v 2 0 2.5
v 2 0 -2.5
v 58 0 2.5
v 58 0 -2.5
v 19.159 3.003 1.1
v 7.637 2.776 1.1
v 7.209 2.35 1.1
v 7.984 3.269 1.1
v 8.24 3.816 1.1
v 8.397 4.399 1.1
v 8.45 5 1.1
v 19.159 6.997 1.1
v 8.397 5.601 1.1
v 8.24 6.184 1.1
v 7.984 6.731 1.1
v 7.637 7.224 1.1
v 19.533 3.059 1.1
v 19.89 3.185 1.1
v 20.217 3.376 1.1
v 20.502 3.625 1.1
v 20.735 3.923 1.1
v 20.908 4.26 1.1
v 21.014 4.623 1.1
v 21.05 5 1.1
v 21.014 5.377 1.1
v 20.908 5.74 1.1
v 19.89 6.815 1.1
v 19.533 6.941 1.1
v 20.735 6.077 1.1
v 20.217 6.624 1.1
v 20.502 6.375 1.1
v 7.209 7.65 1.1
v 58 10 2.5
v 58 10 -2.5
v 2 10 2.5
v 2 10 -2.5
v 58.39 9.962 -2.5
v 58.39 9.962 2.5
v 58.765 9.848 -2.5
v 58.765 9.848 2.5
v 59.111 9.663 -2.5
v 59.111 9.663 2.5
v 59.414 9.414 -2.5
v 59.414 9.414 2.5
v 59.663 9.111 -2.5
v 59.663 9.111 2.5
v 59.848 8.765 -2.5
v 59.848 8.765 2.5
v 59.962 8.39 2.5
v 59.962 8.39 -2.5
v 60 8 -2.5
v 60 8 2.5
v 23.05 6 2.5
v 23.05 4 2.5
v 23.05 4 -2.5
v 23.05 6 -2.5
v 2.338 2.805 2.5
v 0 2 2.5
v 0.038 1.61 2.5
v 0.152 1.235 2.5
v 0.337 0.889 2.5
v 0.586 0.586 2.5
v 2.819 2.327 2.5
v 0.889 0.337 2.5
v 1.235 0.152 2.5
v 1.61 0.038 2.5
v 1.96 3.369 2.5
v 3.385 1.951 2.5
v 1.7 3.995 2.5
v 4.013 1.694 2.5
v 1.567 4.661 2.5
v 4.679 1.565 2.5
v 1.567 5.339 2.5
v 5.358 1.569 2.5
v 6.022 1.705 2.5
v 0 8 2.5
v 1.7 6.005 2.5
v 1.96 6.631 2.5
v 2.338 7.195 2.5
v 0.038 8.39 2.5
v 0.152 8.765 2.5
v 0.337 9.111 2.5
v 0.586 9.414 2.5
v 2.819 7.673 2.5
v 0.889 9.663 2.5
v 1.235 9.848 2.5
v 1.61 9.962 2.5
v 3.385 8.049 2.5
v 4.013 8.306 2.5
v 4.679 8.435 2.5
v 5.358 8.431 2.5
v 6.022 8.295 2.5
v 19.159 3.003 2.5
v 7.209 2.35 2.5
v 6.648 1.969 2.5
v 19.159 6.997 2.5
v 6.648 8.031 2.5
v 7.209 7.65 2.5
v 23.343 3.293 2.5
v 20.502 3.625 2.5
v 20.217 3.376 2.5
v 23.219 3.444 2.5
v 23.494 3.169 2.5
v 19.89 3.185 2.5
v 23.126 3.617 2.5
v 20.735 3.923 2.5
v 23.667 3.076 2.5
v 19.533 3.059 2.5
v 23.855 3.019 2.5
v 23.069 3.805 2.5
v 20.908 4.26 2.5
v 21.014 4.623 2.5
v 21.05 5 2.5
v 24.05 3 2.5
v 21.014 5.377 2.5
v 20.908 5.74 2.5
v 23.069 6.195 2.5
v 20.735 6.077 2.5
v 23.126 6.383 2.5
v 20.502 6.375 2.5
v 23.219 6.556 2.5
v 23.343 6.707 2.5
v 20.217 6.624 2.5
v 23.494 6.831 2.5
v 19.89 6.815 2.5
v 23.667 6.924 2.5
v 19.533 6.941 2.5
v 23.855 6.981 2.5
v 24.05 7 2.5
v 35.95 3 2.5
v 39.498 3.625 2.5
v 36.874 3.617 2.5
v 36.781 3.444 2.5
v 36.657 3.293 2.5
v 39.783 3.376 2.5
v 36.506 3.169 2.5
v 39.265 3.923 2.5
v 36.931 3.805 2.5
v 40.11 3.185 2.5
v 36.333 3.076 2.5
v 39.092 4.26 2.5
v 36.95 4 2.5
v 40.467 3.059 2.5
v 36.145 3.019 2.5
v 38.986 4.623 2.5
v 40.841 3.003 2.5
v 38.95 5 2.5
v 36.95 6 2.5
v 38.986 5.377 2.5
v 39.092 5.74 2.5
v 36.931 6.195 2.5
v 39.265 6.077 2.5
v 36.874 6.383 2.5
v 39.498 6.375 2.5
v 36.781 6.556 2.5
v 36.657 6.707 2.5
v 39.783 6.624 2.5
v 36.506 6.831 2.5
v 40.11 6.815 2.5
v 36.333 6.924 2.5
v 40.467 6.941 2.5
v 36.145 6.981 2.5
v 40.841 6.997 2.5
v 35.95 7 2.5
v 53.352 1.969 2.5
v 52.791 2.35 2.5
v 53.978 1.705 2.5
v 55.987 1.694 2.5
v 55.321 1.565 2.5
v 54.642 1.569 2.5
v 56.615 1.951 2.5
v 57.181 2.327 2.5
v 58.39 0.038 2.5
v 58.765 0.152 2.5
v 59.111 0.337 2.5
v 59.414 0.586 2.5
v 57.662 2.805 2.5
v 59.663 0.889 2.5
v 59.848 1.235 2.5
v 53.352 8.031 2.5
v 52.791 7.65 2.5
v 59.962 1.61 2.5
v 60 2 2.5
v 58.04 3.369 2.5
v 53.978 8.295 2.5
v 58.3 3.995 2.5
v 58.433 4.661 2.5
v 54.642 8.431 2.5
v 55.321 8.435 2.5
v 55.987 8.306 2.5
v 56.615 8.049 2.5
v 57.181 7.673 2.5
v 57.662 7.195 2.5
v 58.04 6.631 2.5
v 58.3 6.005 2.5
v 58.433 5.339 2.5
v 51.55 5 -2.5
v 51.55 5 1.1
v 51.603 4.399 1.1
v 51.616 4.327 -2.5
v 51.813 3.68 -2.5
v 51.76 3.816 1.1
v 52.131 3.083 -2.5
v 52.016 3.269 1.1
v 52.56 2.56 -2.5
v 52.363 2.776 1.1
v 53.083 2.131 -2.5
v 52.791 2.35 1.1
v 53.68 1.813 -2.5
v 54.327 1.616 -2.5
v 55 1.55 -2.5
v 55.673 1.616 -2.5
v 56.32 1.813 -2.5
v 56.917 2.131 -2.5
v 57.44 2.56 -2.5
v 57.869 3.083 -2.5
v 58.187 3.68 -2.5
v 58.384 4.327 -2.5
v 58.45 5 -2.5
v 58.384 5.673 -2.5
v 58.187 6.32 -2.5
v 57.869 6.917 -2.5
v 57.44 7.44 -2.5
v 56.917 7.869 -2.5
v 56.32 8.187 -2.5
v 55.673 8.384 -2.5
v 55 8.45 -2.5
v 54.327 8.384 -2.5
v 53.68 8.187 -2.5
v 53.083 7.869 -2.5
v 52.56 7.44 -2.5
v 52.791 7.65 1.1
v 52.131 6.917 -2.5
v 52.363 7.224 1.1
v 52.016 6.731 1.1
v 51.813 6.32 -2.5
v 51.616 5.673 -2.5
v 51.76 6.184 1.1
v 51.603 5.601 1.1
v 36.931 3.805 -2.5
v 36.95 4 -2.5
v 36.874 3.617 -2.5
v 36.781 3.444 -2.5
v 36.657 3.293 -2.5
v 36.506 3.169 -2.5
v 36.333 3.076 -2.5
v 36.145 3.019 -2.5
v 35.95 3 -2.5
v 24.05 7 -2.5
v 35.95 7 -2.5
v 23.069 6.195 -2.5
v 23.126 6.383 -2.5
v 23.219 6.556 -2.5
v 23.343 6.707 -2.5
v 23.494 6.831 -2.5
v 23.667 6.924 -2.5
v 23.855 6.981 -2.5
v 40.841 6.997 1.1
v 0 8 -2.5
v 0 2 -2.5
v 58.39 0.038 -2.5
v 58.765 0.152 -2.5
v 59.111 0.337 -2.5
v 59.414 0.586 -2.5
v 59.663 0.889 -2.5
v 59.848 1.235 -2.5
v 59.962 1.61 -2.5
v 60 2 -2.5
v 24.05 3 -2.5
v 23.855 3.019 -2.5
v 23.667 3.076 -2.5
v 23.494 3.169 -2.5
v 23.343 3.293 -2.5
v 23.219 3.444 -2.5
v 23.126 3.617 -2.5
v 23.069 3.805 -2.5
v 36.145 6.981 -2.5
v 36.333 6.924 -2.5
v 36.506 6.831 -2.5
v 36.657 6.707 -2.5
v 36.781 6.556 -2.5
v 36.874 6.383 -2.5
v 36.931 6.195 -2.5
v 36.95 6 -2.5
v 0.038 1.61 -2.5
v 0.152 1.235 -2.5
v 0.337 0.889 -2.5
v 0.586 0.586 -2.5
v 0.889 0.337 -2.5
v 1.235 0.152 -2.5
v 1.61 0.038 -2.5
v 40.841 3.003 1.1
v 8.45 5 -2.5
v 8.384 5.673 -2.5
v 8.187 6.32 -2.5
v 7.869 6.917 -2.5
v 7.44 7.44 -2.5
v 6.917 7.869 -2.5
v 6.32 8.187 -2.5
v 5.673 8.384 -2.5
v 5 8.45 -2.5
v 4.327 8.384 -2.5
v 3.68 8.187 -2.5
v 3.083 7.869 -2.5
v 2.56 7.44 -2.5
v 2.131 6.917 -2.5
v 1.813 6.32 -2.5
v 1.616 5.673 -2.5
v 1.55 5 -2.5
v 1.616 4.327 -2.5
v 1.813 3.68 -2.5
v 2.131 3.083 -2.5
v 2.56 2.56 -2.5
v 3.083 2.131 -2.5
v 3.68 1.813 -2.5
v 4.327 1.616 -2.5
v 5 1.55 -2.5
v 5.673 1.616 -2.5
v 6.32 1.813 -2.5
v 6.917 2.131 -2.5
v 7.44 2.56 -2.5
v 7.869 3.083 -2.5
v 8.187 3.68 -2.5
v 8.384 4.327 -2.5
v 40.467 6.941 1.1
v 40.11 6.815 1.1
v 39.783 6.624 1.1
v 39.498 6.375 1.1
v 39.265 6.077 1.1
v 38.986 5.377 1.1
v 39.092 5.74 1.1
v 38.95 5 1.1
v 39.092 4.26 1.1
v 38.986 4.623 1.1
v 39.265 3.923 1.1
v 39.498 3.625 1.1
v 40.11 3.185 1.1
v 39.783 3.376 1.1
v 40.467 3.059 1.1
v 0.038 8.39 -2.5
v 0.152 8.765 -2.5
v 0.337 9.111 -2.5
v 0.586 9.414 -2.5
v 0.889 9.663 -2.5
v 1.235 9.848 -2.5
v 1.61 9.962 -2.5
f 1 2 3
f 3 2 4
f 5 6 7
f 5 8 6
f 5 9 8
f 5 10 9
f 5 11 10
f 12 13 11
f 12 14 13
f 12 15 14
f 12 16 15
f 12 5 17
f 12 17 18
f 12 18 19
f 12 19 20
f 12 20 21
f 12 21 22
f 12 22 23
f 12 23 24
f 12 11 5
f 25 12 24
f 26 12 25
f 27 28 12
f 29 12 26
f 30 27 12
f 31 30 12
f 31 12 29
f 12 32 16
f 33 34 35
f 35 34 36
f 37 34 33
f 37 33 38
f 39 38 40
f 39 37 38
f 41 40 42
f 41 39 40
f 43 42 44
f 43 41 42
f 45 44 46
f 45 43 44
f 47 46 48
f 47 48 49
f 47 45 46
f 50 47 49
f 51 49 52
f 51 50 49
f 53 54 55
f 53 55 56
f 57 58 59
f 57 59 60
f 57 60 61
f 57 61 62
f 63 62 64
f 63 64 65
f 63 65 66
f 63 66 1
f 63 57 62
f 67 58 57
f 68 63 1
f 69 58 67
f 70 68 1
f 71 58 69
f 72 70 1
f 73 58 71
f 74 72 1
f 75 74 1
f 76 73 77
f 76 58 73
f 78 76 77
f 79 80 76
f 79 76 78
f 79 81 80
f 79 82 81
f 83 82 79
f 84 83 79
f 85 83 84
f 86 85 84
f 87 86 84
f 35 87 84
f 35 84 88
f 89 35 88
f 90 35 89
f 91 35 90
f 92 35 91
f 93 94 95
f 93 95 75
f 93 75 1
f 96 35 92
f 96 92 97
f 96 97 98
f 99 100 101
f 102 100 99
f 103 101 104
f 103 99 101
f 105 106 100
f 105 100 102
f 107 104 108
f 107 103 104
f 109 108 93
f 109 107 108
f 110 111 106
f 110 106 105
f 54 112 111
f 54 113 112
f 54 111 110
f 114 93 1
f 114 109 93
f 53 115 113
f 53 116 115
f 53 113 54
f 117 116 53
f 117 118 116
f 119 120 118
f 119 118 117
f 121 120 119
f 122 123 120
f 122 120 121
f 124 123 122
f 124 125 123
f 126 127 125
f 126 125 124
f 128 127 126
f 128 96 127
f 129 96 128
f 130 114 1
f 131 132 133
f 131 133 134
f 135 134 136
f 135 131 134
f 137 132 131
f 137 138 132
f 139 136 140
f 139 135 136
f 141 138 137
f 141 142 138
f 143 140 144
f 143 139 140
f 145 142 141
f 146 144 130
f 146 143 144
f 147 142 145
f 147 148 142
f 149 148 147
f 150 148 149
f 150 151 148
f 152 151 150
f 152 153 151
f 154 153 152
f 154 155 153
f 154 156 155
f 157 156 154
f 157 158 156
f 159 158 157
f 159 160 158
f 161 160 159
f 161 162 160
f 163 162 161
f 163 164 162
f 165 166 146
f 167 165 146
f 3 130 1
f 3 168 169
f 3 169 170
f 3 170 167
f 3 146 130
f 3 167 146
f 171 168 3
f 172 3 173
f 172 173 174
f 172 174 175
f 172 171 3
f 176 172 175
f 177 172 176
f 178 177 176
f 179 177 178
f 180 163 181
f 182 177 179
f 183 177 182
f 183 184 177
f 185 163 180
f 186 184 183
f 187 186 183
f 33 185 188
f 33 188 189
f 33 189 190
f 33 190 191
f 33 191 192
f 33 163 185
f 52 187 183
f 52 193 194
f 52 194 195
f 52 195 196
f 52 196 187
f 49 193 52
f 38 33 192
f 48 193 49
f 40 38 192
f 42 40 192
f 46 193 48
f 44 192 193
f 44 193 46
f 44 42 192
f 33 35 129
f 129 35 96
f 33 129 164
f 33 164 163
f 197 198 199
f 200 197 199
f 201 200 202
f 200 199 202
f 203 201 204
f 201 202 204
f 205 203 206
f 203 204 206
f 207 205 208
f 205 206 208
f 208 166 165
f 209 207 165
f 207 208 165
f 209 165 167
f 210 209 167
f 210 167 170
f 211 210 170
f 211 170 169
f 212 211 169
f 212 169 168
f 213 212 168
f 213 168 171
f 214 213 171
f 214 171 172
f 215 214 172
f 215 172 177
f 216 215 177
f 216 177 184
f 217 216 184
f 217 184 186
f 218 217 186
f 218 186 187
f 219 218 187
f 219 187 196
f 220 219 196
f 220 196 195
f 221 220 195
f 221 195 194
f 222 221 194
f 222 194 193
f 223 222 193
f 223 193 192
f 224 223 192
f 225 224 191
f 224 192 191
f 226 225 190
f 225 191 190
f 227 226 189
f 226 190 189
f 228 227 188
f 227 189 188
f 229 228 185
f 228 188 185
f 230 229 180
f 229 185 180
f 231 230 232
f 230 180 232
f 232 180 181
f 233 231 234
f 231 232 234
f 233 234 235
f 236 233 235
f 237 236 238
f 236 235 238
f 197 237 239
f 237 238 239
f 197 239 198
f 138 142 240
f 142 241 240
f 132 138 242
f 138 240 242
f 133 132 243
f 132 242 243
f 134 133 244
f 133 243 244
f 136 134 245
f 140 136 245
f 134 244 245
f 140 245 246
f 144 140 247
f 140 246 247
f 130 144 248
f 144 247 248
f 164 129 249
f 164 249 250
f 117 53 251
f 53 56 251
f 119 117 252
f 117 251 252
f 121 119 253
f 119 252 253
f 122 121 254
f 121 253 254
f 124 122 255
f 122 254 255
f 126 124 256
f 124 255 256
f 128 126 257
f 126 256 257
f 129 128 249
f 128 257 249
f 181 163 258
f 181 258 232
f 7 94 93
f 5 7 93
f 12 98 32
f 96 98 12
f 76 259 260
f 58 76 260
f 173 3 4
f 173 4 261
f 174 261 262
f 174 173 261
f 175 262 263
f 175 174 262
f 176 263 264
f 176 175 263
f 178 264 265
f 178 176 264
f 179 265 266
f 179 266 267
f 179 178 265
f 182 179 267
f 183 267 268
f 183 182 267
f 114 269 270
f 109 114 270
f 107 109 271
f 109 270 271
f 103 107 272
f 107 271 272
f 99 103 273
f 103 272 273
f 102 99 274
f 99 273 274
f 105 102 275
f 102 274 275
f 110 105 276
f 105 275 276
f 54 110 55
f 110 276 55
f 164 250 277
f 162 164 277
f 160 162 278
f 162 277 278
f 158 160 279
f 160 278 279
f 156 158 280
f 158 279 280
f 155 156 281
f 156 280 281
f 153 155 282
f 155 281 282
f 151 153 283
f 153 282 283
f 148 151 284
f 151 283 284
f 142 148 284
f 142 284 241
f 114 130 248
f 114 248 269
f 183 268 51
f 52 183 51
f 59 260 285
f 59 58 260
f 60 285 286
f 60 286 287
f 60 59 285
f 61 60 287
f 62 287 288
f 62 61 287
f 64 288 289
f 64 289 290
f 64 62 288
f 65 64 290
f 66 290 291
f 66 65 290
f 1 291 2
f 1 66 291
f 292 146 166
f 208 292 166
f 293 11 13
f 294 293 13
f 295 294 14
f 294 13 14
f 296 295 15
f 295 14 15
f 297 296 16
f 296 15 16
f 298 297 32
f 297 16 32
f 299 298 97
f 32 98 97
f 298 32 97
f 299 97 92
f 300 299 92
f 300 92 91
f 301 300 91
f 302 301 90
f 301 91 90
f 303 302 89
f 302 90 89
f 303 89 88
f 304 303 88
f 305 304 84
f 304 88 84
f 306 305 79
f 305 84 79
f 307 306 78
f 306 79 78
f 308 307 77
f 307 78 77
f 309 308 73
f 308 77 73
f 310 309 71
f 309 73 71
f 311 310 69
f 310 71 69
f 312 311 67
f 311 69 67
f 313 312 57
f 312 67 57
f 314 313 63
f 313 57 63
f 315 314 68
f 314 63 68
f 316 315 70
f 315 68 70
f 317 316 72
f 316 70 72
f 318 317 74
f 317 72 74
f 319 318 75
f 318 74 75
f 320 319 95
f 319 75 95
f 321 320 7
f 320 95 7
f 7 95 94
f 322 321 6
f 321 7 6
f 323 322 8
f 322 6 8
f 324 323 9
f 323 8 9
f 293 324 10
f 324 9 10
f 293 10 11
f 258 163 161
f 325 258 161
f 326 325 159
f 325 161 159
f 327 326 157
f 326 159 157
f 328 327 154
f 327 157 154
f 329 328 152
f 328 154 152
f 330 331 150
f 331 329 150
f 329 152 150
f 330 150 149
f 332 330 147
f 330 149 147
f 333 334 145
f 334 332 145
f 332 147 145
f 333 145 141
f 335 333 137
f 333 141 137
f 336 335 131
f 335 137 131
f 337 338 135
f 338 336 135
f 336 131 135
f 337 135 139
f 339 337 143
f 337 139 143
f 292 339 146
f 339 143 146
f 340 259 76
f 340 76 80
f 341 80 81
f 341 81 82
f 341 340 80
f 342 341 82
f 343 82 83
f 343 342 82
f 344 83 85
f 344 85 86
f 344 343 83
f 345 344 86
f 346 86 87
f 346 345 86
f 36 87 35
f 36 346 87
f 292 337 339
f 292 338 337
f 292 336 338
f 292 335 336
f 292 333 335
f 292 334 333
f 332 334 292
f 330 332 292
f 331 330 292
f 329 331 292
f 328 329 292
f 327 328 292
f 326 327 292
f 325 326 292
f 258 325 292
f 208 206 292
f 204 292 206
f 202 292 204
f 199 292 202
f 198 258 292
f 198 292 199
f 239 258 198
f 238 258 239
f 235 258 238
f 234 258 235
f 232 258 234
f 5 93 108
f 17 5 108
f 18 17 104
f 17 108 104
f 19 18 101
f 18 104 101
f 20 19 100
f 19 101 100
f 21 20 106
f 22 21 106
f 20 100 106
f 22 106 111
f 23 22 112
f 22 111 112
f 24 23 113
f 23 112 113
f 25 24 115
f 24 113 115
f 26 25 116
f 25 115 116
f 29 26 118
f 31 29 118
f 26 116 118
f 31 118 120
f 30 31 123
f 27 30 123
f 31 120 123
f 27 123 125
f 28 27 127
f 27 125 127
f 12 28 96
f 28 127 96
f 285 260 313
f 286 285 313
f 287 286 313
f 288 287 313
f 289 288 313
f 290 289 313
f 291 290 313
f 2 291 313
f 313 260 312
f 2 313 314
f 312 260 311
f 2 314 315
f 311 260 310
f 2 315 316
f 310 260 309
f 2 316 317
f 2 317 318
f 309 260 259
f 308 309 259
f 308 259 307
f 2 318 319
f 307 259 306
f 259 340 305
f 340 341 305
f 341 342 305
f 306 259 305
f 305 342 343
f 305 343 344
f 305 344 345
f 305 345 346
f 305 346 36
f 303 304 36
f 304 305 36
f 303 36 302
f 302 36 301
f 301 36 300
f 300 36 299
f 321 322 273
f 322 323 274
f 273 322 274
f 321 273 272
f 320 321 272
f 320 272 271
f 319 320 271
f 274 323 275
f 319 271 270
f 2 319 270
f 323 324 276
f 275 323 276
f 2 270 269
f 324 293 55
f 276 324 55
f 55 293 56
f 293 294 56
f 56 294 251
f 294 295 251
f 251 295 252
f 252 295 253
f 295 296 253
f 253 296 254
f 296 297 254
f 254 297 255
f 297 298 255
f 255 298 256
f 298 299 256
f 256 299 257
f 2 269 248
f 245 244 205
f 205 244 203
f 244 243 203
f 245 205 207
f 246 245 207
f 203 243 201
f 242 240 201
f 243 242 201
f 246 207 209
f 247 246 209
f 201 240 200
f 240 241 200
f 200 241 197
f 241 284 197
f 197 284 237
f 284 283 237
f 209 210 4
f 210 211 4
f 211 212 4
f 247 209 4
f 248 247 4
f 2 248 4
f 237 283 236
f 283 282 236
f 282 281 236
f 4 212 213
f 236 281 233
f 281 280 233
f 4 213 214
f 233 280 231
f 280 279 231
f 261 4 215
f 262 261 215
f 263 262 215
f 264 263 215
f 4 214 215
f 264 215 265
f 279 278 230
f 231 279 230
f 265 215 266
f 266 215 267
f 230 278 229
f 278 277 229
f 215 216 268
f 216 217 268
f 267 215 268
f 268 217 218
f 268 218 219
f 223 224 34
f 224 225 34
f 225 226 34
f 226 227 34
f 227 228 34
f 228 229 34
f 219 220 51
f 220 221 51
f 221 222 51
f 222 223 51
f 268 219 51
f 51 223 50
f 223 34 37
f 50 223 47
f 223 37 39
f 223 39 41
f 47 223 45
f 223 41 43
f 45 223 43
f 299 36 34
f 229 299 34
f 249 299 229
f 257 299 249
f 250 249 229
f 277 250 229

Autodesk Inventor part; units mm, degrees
ref_plane "YZ Plane" through (0, 0, 0) normal (1, 0, 0) x (0, 1, 0)
ref_plane "XZ Plane" through (0, 0, 0) normal (0, 1, 0) x (-1, 0, 0)
sketch "Sketch1" plane through (0, 0, 0) normal (0, 0, 1) x (1, 0, 0)
  line L0 (0, 0) -> (60, 0)
  line L1 (60, 0) -> (60, 10)
  line L2 (60, 10) -> (0, 10)
  line L3 (0, 10) -> (0, 0)
  line L4 (30, 10) -> (30, 0) construction
  dimension "d0" = 60
  dimension "d2" = 10
extrude "Extrusion1" add sketch "Sketch1" along normal mid plane 5
sketch "Sketch2" plane through (0, 0, 2.5) normal (0, 0, 1) x (1, 0, 0)
  circle A0 centre (5, 5) radius 3.45
  line L0 (60, 10) -> (0, 10) projected
  line L1 (60, 0) -> (60, 10) projected
  line L2 (60, 10) -> (0, 10) projected
  line L3 (0, 10) -> (0, 0) projected
  line L4 (0, 0) -> (60, 0) projected
  line L5 (7.2091, 7.65) -> (7.2091, 2.35) construction
  arc A1 (19.1591, 3.003) -> (19.1591, 6.997) centre (19.05, 5) ccw
  line L6 (7.2091, 7.65) -> (19.1591, 6.997)
  line L7 (5, 5) -> (19.05, 5) construction
  line L8 (7.2091, 2.35) -> (19.1591, 3.003)
  line L9 (0, 5) -> (5, 5) construction
  line L10 (5, 10) -> (5, 5) construction
  dimension "d8" = 6.9
  dimension "d9" = 5.3
  dimension "d10" = 14.05
  dimension "d11" = 2
extrude "Extrusion2" cut sketch "Sketch2" along normal through all both and the other way through all contours A0
extrude "Extrusion3" cut sketch "Sketch2" against normal blind 1.4 contours A0 L6 A1 L8
ref_plane "Work Plane1" through (30, 0, 2.5) normal (-1, 0, 0) x (0, 0, 1)
mirror "Mirror1" about plane through (30, 0, 2.5) normal (-1, 0, 0) of "Extrusion2", "Extrusion3"
fillet "Fillet1" radius 2 4 edges at (60, 10, 0) (60, 0, 0) (0, 0, 0) (0, 10, 0)
sketch "Sketch3" plane through (0, 0, 2.5) normal (0, 0, 1) x (1, 0, 0)
  line L0 (30, -2) -> (30, 12) projected
  line L1 (0, 8) -> (0, 2) projected
  line L2 (23.05, 7) -> (36.95, 7)
  line L3 (36.95, 7) -> (36.95, 3)
  line L4 (36.95, 3) -> (23.05, 3)
  line L5 (23.05, 3) -> (23.05, 7)
  line L6 (23.05, 7) -> (36.95, 3) construction
  line L7 (36.95, 7) -> (23.05, 3) construction
  arc A0 (40.8409, 6.997) -> (40.8409, 3.003) centre (40.95, 5) ccw construction
  line L8 (58, 10) -> (2, 10) construction
  line L9 (30, 7) -> (30, 10) construction
  line L10 (2, 0) -> (58, 0) projected
  point P0 (0, 0)
  point P1 (30, 5)
  point P2 (38.95, 5)
  point P3 (0, 5)
  dimension "d26" = 2
  dimension "d27" = 3
extrude "Extrusion4" cut sketch "Sketch3" against normal through all
fillet "Fillet2" radius 1 4 edges at (23.05, 7, 0) (23.05, 3, 0) (36.95, 3, 0) (36.95, 7, 0)
properties part number "leg_v0.1"
